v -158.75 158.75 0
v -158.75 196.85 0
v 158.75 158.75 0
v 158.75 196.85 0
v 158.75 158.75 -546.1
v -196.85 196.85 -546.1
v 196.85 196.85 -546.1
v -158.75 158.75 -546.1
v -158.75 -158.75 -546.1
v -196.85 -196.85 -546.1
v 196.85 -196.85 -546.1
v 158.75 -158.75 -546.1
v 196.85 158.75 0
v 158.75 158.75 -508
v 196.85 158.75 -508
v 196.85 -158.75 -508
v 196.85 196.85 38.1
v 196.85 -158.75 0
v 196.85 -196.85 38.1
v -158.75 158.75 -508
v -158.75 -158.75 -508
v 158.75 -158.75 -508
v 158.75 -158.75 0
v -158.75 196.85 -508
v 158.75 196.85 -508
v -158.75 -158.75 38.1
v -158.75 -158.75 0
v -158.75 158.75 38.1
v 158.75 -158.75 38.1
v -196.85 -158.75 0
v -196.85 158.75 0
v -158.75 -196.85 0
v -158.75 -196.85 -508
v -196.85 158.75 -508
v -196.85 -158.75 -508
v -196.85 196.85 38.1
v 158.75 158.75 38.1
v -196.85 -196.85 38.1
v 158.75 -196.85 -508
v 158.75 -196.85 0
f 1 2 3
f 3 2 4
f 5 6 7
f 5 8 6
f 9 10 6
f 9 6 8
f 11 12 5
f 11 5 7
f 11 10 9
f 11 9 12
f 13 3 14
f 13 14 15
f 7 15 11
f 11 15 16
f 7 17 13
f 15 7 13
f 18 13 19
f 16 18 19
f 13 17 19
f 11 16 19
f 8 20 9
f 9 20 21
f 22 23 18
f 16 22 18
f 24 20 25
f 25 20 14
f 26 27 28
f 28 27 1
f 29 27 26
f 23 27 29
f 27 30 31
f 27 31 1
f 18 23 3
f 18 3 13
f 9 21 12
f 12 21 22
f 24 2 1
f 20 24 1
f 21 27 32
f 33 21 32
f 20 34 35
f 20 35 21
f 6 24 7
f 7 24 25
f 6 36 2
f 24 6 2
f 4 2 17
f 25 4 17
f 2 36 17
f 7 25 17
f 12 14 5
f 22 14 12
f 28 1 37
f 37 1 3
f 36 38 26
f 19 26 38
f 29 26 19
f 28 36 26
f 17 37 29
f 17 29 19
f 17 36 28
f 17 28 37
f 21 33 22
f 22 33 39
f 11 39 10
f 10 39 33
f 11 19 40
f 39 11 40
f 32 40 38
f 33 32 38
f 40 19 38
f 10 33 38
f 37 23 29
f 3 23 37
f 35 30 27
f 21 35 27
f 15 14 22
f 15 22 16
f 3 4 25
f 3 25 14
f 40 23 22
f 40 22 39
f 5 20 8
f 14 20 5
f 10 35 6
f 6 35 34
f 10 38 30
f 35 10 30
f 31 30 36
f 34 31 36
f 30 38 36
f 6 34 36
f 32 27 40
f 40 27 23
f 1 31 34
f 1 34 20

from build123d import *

# Parameters (mm, degrees)
F0_W     = 393.7
F0_H     = 393.7
F0_W_2   = 317.5
F0_H_2   = 317.5
F1_DEPTH = 38.1
F2_W     = 38.1
F2_H     = 38.1
F3_DEPTH = 508
F4_W     = 317.5
F4_H     = 317.5
F5_DEPTH = 38.1


with BuildPart() as f1:
    # F0 (on Top) → F1 (new body)
    with BuildSketch(Plane.XY):
        Rectangle(F0_W, F0_H)
        Rectangle(F0_W_2, F0_H_2, mode=Mode.SUBTRACT)
    extrude(amount=F1_DEPTH)

    # F2 (on face) → F3 (join)
    with BuildSketch(Plane(origin=(0, 0, 0), x_dir=(1, 0, 0), z_dir=(0, 0, -1))):
        with Locations((-177.8, 177.8)):
            Rectangle(F2_W, F2_H)
        with Locations((-177.8, -177.8)):
            Rectangle(F2_W, F2_H)
        with Locations((177.8, 177.8)):
            Rectangle(F2_W, F2_H)
        with Locations((177.8, -177.8)):
            Rectangle(F2_W, F2_H)
    extrude(amount=F3_DEPTH)

    # F4 (on face) → F5 (join)
    with BuildSketch(Plane(origin=(0, 0, -508), x_dir=(1, 0, 0), z_dir=(0, 0, -1))):
        Polygon((158.75, -196.85), (196.85, -196.85), (196.85, -158.75), (196.85, 158.75), (196.85, 196.85), (158.75, 196.85), (-158.75, 196.85), (-196.85, 196.85), (-196.85, 158.75), (-196.85, -158.75), (-196.85, -196.85), (-158.75, -196.85), align=None)
        Rectangle(F4_W, F4_H, mode=Mode.SUBTRACT)
    extrude(amount=F5_DEPTH)


solid = f1.part
